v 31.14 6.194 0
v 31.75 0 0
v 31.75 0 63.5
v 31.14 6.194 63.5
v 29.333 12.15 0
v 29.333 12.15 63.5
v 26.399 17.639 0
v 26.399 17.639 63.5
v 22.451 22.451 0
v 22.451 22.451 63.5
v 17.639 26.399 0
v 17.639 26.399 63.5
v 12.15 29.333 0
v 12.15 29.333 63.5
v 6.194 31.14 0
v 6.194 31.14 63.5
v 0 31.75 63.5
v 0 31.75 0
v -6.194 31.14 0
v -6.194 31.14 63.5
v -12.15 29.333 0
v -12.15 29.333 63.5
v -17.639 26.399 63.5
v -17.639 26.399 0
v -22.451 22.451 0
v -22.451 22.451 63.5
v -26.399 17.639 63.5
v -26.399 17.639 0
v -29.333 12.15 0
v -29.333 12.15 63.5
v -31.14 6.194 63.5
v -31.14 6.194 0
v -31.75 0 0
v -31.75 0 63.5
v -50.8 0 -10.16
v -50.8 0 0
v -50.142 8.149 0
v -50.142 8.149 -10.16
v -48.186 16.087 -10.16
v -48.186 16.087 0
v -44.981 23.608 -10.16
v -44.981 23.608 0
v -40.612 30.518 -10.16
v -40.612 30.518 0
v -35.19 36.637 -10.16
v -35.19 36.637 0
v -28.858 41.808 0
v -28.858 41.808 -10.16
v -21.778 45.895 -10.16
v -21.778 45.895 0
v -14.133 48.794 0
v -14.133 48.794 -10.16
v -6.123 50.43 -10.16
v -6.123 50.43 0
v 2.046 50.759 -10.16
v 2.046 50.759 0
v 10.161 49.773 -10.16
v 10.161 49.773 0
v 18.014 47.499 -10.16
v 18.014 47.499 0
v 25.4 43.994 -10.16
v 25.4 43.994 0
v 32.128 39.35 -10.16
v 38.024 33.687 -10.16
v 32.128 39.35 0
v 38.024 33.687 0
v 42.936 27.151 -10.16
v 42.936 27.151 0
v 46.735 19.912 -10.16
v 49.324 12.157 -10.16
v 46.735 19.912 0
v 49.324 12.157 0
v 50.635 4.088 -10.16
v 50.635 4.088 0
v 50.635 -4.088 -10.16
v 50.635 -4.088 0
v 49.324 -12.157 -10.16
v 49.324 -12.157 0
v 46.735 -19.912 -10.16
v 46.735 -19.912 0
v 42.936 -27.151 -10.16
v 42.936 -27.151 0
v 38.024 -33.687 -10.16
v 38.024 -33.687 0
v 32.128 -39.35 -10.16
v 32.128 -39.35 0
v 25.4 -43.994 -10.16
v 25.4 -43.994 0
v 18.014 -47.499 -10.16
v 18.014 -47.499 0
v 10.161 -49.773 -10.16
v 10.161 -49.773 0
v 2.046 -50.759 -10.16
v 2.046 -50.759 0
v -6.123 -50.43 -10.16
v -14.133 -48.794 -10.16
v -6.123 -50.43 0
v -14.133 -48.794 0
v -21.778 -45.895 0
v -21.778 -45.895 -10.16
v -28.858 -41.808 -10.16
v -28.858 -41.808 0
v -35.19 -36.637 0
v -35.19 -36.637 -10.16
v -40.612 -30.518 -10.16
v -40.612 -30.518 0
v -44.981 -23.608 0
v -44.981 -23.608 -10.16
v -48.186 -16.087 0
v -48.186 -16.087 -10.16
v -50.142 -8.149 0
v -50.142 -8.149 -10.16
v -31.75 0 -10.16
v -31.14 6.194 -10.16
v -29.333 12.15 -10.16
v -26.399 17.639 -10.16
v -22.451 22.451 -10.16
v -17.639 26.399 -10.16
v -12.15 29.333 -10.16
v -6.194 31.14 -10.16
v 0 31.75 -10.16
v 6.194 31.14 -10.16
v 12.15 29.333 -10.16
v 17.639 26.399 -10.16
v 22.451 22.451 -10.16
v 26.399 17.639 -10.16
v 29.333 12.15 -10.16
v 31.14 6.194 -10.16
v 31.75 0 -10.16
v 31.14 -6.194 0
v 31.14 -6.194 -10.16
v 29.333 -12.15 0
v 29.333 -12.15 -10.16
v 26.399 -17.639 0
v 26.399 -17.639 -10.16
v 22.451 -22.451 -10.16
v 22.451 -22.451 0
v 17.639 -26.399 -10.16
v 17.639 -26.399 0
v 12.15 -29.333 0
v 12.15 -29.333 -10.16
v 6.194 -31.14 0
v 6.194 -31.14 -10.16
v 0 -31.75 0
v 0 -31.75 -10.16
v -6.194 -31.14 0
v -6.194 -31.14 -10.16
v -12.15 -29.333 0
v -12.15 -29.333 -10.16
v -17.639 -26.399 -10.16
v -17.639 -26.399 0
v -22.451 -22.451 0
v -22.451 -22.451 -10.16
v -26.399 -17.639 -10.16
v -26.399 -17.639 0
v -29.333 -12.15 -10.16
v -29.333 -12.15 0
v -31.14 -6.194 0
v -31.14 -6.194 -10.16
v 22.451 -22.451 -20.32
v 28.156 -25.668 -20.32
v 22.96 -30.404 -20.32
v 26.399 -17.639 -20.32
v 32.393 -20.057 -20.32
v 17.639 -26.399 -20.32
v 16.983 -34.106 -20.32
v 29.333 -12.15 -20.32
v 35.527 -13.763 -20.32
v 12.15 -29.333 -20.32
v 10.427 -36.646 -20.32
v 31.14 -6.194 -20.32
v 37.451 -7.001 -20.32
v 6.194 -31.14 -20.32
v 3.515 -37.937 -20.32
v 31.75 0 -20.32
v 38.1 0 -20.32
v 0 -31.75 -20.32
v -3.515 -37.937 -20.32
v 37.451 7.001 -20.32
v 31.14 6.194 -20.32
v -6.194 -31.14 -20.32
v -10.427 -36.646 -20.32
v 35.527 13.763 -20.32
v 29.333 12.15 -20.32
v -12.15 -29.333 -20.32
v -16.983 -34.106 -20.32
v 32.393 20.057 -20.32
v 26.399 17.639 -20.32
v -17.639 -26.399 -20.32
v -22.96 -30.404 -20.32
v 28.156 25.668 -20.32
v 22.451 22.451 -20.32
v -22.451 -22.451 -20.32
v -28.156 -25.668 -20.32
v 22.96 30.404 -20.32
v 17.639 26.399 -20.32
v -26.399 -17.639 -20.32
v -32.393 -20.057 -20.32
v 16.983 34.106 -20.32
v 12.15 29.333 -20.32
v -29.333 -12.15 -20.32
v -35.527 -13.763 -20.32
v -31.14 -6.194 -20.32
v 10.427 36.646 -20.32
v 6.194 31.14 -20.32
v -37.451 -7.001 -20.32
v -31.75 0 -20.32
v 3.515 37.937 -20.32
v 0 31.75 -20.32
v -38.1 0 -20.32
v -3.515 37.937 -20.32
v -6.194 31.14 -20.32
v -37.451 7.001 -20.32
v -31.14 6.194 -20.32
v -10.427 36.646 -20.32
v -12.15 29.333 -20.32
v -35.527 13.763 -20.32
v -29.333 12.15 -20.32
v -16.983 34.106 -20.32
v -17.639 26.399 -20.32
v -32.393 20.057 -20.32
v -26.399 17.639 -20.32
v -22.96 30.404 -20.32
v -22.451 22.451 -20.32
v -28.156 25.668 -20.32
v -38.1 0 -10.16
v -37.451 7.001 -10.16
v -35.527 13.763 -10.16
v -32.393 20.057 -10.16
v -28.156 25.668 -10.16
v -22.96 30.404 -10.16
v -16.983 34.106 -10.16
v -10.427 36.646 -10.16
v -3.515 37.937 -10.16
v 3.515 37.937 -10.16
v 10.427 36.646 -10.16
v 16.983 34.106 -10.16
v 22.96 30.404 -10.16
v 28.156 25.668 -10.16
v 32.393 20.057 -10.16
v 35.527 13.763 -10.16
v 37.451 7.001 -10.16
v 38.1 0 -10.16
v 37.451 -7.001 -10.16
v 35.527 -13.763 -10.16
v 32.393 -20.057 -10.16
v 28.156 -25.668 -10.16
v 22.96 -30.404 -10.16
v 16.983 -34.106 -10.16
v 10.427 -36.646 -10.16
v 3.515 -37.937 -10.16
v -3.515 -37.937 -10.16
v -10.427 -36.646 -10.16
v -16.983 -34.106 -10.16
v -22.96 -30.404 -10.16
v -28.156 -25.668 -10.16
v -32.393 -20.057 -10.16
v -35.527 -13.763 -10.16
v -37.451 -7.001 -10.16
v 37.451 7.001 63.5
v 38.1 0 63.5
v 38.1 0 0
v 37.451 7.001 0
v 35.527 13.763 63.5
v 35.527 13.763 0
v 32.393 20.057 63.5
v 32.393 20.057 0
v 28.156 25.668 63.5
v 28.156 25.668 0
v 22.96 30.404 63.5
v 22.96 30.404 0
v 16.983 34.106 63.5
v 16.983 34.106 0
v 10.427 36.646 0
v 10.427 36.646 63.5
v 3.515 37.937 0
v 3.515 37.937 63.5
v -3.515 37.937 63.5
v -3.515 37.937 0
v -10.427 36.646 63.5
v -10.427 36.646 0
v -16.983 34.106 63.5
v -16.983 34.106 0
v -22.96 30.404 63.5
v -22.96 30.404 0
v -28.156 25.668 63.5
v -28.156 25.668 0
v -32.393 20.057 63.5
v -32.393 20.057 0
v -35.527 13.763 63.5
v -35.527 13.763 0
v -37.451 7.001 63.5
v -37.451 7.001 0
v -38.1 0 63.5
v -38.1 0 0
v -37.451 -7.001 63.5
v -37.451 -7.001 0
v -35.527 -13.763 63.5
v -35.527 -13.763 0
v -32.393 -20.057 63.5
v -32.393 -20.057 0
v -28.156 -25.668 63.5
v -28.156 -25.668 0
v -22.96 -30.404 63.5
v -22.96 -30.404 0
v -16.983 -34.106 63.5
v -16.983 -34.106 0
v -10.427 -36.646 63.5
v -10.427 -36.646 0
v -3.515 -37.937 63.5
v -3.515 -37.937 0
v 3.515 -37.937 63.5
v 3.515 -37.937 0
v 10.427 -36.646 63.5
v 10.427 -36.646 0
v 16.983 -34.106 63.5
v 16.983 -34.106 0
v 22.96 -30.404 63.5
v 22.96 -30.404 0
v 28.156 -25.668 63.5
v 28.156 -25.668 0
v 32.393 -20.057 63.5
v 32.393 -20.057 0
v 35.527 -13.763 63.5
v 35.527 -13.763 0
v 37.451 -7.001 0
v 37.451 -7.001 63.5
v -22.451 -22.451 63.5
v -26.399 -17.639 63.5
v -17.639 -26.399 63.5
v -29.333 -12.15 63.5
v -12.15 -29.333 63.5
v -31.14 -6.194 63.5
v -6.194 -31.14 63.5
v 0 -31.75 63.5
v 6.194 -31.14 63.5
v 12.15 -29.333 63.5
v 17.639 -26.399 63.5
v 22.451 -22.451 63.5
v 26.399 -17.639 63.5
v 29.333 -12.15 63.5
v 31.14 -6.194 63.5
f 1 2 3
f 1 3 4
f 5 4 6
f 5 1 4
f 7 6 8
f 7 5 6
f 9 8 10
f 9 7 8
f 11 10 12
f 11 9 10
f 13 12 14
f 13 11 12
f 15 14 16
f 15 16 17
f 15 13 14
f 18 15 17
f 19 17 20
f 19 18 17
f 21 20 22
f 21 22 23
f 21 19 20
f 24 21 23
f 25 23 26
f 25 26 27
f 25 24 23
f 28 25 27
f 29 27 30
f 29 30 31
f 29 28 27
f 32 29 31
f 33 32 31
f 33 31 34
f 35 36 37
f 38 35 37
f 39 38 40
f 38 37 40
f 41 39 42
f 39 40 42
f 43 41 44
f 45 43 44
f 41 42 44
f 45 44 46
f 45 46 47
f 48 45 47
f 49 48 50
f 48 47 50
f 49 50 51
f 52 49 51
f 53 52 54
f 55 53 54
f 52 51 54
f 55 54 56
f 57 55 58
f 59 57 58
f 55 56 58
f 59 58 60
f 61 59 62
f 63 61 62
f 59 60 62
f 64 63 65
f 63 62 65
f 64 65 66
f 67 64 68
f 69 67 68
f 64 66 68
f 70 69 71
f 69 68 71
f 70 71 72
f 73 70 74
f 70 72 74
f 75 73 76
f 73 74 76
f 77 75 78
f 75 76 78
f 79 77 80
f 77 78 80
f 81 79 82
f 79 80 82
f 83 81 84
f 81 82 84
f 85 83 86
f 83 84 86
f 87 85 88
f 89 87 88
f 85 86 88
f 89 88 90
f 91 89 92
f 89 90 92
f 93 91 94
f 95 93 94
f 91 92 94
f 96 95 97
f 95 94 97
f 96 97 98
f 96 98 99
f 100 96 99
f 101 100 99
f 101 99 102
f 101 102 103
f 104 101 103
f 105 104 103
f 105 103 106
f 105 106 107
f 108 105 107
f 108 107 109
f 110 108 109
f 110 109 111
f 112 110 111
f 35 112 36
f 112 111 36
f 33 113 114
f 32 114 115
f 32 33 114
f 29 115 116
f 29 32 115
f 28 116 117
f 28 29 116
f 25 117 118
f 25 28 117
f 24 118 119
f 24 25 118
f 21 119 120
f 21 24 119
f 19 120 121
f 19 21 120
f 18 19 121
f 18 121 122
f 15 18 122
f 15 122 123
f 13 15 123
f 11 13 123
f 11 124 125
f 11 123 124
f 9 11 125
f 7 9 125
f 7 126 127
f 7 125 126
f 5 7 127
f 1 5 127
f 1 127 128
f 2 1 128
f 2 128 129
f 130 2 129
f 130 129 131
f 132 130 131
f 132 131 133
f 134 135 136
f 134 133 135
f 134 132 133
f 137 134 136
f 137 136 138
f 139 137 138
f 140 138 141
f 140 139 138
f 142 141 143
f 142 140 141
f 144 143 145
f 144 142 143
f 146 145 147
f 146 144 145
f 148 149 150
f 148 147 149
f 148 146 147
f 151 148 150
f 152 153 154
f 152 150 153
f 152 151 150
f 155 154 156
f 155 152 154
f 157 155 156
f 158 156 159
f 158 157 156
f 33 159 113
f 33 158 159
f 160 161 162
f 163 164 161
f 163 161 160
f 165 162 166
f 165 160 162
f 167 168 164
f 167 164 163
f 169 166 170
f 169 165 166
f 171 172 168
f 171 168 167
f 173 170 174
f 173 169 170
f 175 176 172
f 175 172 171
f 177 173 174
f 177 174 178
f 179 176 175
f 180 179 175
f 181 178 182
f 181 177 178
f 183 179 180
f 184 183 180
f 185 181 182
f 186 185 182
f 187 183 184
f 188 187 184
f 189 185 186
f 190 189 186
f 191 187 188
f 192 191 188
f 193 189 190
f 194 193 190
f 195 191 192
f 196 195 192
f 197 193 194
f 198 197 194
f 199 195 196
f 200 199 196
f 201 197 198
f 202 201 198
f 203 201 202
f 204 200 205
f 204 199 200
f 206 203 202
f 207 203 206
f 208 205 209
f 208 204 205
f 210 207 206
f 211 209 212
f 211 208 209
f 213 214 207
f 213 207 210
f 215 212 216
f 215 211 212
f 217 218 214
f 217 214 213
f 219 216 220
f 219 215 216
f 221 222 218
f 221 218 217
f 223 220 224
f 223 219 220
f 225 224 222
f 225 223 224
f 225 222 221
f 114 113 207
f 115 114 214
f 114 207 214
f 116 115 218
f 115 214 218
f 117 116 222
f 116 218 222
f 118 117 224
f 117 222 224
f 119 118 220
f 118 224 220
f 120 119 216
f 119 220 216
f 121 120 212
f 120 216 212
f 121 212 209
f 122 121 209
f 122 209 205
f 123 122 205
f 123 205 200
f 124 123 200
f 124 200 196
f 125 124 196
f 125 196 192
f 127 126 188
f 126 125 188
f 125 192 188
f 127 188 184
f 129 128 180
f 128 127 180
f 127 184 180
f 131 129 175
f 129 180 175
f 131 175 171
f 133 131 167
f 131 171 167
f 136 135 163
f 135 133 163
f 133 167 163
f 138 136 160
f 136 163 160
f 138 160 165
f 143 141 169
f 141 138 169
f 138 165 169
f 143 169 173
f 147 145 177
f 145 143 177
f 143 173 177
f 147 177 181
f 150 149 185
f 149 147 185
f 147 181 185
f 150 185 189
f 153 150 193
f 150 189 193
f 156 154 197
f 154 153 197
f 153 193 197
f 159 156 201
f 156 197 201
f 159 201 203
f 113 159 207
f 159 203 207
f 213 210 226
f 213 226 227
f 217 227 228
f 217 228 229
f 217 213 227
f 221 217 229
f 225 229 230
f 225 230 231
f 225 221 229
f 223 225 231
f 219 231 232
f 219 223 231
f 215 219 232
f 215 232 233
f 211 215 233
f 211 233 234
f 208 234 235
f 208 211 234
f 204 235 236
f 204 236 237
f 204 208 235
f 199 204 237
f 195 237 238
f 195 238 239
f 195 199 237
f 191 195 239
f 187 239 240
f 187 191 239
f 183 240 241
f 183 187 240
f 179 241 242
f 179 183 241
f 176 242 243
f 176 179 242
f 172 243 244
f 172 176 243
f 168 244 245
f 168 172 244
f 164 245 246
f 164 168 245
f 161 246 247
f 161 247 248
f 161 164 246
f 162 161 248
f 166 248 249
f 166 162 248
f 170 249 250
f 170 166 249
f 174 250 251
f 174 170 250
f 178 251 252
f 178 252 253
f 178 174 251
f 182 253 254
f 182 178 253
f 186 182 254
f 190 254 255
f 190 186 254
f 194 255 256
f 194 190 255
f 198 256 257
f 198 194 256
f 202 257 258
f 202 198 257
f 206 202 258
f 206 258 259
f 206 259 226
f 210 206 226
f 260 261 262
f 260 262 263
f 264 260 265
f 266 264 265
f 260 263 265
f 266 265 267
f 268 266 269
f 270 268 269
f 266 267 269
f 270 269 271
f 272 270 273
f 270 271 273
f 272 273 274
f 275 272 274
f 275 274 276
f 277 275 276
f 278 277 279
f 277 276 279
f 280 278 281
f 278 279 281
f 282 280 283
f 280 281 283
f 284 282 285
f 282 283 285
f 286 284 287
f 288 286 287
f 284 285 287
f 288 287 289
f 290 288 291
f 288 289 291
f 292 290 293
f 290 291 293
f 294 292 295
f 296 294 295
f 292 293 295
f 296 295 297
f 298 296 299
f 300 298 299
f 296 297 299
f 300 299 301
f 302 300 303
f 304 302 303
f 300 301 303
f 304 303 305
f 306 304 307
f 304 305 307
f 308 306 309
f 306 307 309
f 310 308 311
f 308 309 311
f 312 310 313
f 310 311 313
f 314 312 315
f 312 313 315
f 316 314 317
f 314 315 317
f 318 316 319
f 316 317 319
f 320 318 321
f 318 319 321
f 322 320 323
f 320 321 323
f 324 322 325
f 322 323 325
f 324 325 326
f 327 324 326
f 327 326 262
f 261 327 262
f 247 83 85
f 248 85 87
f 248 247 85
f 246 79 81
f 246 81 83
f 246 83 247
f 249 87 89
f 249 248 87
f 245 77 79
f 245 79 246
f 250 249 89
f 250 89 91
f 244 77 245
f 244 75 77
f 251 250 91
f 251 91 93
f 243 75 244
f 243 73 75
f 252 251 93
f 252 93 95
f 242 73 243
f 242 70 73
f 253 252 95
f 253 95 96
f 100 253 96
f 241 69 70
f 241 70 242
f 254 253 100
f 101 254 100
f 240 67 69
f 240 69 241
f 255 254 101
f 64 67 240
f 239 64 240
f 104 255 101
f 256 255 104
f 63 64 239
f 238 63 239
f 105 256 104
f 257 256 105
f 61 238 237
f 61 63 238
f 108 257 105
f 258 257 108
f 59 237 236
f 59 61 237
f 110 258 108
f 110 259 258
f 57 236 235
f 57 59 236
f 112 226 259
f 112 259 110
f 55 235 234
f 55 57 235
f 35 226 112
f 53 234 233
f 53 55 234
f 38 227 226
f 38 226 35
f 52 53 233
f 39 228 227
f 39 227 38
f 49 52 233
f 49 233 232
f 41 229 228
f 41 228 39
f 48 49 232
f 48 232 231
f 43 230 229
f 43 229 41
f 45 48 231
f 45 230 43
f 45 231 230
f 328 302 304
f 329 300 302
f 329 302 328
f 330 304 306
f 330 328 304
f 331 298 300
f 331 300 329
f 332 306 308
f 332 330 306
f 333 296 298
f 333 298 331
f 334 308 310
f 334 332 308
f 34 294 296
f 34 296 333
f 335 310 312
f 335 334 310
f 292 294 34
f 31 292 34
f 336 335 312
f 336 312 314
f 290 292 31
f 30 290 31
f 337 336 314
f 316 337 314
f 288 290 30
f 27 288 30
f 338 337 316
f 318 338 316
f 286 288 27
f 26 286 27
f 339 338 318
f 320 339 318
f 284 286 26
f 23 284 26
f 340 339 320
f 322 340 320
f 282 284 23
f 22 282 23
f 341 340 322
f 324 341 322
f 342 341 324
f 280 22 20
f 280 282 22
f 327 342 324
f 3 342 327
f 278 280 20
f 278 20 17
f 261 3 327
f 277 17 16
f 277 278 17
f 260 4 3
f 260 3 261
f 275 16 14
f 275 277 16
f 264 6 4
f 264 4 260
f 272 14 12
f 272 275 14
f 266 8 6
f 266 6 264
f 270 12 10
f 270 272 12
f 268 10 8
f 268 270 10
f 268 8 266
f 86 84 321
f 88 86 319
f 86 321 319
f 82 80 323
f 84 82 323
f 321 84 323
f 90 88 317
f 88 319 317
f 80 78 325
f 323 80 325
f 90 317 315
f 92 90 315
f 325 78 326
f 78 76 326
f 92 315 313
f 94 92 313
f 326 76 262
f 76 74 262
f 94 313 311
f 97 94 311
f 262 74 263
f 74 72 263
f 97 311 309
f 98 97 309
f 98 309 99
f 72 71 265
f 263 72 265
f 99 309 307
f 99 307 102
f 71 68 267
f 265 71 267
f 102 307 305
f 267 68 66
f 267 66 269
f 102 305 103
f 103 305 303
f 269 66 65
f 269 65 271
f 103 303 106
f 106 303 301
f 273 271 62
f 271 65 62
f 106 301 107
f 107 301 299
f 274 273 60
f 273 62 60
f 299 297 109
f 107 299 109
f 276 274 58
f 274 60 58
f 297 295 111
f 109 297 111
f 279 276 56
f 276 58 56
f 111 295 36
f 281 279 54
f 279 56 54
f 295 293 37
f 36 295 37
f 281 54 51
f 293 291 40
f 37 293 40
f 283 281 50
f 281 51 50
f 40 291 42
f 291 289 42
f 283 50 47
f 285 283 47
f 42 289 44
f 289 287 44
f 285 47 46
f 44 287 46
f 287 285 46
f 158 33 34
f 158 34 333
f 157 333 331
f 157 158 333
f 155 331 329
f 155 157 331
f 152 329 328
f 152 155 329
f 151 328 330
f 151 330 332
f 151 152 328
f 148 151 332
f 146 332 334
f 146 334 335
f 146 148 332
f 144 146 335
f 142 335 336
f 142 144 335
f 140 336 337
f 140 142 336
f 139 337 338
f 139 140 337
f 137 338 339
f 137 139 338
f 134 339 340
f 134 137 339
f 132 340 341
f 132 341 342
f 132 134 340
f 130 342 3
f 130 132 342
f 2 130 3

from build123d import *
from build123d.topology import SkipClean

# Parameters (mm, degrees)
SKETCH1_R               = 38.1
SKETCH1_R_2             = 31.75
BOSS_EXTRUDE1_DEPTH     = 63.5
SKETCH2_R               = 50.8
BOSS_EXTRUDE2_DEPTH     = 10.16
CUT_EXTRUDE2_DEPTH      = 53.34
CUT_EXTRUDE2_DEPTH_BACK = 96.882897328
SKETCH3_R               = 31.75
BOSS_EXTRUDE3_START     = 10.16
SKETCH4_R               = 38.1
SKETCH4_R_2             = 31.75
BOSS_EXTRUDE3_DEPTH     = 10.16


with BuildPart() as part:
    # Sketch1 → Boss-Extrude1 (new body)
    with BuildSketch(Plane.XY):
        Circle(SKETCH1_R)
        Circle(SKETCH1_R_2, mode=Mode.SUBTRACT)
    extrude(amount=BOSS_EXTRUDE1_DEPTH)

    # Sketch2 → Boss-Extrude2 (add)
    with BuildSketch(Plane(origin=(0, 0, 0), x_dir=(-1, 0, 0), z_dir=(0, 0, -1))):
        Circle(SKETCH2_R)
    extrude(amount=BOSS_EXTRUDE2_DEPTH)

    # Sketch3 → Cut-Extrude2 (cut, two sides: drawn at the far end of the back side and taken through both)
    with SkipClean():  # the faces are left unmerged after this step: merging them gives an invalid solid
        with BuildSketch(Plane(origin=(0, 0, 0), x_dir=(-1, 0, 0), z_dir=(0, 0, -1)).offset(-CUT_EXTRUDE2_DEPTH_BACK)):
            Circle(SKETCH3_R)
        extrude(amount=CUT_EXTRUDE2_DEPTH + CUT_EXTRUDE2_DEPTH_BACK, mode=Mode.SUBTRACT)
    add(part.part.scale(1), mode=Mode.REPLACE)  # the faces are merged on a copy

    # Sketch4 → Boss-Extrude3 (add)
    with BuildSketch(Plane(origin=(0, 0, -10.16), x_dir=(-1, 0, 0), z_dir=(0, 0, -1)).offset(BOSS_EXTRUDE3_START)):
        Circle(SKETCH4_R)
        Circle(SKETCH4_R_2, mode=Mode.SUBTRACT)
    extrude(amount=-BOSS_EXTRUDE3_DEPTH)


solid = part.part
